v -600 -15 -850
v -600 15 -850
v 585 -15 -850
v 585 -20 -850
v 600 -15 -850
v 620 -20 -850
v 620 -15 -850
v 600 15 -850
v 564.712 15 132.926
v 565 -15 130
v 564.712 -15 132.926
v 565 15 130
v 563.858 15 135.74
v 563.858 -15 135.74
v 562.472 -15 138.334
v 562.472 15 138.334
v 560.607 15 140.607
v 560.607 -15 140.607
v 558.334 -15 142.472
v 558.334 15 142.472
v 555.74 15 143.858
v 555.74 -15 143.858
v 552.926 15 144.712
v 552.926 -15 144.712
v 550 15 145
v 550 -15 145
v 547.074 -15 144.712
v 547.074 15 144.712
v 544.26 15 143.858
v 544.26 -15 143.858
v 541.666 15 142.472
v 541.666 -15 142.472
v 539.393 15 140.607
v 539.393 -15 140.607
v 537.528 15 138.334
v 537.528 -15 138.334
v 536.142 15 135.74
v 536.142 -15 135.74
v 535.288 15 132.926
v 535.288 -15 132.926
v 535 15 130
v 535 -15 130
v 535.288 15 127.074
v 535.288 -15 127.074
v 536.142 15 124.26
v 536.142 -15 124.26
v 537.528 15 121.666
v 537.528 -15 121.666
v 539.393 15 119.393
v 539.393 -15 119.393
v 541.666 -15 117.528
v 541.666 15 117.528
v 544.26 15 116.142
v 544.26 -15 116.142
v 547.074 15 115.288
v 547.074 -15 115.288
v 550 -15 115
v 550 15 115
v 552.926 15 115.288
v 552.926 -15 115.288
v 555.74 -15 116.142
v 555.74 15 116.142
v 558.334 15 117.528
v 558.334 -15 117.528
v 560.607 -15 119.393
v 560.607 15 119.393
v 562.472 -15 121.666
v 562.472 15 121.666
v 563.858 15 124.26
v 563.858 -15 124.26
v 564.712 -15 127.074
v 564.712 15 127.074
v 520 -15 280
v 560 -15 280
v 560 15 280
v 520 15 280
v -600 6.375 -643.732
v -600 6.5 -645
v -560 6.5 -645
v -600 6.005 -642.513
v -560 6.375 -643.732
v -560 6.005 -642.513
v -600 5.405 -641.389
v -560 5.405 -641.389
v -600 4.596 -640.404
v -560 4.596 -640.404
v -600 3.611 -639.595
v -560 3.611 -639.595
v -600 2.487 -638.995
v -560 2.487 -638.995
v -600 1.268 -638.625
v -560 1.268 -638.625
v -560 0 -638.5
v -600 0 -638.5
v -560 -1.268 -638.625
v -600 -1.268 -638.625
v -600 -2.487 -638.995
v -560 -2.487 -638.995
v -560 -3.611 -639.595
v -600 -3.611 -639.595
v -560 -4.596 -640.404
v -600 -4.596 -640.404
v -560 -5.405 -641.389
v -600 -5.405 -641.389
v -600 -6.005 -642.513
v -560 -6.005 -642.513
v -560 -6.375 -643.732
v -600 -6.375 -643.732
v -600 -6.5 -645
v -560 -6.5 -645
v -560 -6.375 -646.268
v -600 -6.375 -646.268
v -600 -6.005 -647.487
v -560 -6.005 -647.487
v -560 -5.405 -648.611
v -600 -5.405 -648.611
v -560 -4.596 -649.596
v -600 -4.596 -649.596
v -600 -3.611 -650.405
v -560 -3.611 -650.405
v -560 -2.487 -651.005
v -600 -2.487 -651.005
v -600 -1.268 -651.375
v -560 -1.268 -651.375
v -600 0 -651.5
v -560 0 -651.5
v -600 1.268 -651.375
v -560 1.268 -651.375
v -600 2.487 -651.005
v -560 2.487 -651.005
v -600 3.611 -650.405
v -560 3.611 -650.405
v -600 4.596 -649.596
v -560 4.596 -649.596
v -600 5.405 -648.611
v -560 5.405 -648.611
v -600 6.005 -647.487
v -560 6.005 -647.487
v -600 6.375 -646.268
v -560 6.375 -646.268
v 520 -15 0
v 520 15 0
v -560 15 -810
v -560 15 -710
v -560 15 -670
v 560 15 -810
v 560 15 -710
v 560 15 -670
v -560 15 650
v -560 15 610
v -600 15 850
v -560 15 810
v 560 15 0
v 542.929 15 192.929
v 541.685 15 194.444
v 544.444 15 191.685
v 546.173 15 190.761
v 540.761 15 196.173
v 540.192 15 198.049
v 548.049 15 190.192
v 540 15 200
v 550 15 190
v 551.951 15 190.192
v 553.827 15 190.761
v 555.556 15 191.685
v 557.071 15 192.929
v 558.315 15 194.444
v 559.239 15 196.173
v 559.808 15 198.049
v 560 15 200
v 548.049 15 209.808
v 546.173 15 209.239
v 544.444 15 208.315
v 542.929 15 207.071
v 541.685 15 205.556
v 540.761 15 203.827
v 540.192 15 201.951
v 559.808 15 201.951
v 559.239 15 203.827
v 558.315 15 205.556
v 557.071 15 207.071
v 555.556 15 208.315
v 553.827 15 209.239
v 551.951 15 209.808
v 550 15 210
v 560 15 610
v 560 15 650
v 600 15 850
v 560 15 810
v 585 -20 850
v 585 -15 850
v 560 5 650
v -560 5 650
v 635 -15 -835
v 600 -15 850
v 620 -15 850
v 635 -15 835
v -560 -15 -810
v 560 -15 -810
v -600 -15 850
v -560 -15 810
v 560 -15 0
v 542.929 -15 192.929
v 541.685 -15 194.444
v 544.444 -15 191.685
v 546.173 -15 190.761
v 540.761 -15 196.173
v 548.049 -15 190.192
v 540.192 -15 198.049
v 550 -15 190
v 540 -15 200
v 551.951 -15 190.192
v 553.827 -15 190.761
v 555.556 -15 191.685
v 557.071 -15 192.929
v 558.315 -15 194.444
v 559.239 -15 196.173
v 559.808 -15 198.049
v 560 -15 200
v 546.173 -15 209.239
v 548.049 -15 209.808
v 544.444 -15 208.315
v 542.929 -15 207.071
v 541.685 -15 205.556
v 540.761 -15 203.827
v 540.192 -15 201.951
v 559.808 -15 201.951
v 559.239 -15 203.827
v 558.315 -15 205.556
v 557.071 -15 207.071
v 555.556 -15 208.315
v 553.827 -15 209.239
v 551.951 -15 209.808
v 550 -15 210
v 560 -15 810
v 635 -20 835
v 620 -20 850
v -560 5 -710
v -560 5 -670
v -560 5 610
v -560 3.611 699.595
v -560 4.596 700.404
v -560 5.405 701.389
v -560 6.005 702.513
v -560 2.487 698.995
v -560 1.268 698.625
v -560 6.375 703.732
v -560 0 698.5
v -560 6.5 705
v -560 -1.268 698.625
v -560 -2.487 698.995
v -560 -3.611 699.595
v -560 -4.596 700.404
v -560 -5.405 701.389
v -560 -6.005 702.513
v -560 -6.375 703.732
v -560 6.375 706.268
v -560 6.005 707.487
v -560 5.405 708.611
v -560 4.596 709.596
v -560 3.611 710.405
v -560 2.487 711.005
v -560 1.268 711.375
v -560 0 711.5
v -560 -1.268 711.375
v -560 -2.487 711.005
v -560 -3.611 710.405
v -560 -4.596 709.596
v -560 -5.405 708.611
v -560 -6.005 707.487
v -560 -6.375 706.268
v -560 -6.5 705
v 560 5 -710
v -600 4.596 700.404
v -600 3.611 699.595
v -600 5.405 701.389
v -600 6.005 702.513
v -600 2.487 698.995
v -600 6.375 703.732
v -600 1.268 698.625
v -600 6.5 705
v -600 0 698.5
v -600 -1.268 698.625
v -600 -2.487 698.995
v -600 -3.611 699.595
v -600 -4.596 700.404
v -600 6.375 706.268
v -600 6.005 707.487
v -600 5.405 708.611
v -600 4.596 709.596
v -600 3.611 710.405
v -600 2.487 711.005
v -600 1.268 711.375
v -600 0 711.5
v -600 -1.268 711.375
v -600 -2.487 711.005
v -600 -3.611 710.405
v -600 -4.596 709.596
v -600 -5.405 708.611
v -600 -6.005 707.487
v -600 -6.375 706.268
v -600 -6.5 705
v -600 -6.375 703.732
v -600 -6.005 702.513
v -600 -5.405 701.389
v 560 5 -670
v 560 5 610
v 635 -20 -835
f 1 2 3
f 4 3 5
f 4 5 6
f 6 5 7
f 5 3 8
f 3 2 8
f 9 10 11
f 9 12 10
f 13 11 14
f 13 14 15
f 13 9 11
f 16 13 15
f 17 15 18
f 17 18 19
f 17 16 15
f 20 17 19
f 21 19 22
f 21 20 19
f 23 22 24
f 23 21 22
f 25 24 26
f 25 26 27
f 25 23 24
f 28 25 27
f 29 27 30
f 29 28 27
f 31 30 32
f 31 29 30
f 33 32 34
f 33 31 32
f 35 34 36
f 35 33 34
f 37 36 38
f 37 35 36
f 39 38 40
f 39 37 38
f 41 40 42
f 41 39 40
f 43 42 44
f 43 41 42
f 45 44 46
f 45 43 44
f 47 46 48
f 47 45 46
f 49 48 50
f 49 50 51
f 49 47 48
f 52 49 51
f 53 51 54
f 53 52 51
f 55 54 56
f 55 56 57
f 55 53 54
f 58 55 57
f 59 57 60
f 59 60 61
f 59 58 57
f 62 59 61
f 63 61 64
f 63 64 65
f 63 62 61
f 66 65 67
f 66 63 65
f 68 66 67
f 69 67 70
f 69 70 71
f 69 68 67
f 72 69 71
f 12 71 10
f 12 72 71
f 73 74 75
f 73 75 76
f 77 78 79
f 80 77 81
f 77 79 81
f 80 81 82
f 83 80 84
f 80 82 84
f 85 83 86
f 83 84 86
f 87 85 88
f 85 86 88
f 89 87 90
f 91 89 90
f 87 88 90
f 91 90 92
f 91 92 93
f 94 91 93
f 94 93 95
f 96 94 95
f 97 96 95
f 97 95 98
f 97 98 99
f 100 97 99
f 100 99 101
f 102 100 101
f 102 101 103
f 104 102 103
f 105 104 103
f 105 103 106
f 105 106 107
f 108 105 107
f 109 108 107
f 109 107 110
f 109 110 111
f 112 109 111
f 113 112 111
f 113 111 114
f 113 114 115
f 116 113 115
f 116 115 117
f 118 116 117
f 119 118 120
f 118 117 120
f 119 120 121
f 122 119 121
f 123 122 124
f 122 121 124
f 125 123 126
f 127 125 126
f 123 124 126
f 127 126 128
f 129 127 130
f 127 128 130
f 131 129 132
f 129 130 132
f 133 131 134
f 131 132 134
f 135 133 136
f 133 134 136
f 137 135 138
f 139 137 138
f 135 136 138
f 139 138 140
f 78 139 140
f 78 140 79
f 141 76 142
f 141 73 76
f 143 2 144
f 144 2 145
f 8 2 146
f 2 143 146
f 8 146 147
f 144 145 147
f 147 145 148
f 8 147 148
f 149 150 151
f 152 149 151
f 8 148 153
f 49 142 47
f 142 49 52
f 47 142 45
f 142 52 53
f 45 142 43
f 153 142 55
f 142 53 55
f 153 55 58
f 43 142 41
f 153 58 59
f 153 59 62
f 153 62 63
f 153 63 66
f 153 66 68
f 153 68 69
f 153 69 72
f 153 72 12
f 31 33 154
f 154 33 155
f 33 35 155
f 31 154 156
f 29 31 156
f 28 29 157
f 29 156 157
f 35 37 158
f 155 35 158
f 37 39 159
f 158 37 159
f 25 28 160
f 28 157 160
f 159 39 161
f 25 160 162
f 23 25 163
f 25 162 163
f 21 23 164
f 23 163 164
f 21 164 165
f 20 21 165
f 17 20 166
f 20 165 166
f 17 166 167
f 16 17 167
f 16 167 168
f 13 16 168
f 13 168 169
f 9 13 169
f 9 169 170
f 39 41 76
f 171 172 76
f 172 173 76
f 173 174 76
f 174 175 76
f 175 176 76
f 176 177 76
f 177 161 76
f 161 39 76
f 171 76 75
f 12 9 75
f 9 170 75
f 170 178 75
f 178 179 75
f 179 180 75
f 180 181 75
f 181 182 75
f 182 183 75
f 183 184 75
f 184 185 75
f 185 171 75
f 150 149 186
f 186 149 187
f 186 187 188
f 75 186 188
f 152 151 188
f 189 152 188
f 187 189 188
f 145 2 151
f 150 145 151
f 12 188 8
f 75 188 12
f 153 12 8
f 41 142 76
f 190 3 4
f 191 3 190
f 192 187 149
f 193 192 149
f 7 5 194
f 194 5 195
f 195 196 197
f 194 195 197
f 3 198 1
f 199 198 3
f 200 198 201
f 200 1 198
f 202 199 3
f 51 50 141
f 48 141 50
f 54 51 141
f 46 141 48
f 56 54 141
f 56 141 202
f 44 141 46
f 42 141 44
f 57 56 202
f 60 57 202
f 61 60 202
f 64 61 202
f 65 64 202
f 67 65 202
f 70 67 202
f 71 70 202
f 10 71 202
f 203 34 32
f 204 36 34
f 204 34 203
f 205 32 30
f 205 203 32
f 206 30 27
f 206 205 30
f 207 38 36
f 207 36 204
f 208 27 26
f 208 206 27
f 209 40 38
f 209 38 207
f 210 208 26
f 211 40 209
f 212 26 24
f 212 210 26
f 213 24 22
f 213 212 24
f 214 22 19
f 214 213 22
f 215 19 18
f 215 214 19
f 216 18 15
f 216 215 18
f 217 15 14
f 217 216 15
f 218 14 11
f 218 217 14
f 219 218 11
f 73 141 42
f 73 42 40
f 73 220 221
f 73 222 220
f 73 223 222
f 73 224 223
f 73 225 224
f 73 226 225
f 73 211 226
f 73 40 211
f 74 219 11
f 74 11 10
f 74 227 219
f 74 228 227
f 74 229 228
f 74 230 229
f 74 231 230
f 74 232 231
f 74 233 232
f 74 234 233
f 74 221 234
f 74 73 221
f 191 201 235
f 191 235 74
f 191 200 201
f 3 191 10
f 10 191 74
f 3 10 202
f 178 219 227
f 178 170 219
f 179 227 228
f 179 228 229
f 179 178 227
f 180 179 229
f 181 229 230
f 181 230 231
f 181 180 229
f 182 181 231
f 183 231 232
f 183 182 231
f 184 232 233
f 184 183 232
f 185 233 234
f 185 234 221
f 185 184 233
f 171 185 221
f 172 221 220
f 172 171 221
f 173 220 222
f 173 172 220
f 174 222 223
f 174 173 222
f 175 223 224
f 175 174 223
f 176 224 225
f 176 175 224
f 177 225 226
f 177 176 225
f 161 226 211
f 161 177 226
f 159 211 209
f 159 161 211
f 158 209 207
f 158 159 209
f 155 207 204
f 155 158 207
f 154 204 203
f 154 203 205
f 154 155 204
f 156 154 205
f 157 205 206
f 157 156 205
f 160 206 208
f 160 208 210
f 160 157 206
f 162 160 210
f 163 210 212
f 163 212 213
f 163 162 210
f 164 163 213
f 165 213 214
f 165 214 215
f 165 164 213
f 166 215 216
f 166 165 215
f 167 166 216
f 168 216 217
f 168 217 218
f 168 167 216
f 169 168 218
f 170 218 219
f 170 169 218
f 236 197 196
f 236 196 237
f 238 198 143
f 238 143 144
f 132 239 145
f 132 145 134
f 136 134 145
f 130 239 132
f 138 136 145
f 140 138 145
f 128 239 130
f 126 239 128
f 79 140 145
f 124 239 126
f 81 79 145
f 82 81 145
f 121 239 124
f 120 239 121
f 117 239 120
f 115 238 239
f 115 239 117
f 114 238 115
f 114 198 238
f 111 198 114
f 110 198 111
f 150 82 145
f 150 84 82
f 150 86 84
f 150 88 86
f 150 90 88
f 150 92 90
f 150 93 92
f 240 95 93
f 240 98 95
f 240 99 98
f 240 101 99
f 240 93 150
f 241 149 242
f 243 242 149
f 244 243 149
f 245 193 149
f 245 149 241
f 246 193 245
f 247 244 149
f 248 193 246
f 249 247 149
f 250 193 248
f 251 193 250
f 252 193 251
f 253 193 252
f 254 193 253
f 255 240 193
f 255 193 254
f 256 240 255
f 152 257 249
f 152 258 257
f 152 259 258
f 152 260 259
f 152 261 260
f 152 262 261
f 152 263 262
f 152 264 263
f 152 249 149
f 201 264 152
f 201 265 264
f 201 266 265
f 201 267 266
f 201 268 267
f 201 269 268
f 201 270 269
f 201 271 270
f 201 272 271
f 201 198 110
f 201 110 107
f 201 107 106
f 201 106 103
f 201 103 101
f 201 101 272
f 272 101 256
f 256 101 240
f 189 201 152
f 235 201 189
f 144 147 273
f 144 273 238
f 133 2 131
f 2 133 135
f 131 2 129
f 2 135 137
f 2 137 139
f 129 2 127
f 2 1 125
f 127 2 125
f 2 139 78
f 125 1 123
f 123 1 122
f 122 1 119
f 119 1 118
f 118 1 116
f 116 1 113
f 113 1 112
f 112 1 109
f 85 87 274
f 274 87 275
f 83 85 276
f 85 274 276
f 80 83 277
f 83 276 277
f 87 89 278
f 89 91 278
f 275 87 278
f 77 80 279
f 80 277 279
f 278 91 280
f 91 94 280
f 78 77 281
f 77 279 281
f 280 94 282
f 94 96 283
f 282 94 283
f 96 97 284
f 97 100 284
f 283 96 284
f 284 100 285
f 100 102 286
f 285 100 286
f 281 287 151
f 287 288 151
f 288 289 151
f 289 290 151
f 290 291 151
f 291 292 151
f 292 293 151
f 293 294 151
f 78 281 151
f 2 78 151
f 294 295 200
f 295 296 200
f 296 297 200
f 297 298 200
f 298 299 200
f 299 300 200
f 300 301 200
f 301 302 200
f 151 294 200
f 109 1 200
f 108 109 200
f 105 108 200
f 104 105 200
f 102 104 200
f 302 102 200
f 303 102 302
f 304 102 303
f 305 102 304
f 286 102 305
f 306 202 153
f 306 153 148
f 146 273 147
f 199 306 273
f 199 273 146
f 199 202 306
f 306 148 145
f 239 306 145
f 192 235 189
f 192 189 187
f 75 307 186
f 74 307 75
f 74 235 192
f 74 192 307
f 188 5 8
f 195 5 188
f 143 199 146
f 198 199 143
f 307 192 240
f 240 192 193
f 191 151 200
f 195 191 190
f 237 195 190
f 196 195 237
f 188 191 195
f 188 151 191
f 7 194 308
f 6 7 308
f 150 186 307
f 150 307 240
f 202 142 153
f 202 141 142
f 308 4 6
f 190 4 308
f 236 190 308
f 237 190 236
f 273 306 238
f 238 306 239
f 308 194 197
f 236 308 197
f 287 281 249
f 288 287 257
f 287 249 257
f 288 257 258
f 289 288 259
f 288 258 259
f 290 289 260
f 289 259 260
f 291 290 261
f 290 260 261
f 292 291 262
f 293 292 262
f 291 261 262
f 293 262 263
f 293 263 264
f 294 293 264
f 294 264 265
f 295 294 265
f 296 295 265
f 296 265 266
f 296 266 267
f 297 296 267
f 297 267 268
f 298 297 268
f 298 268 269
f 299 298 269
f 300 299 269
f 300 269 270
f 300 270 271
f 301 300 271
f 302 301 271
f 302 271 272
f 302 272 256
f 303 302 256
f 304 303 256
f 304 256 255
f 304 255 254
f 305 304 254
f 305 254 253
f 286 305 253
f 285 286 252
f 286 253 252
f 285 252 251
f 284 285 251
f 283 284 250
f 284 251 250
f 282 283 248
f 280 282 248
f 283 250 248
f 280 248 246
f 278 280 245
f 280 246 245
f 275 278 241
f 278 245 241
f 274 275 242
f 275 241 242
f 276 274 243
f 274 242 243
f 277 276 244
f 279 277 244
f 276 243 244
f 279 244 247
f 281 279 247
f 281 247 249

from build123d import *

# Parameters (mm, degrees)
F0_W     = 1200
F0_H     = 1700
F0_R     = 15
F0_R_2   = 10
F1_DEPTH = 15
F2_W     = 1120
F2_H     = 40
F3_DEPTH = 10
F5_D     = 13
F5_DEPTH = 50
F5_TIP   = 3.9055940237
F6_D     = 13
F6_DEPTH = 50
F6_TIP   = 3.9055940237
F7_W     = 50
F7_H     = 1700
F8_DEPTH = 5
F9_SIZE  = 15


with BuildPart() as f1:
    # F0 (on Front) → F1 (new body, symmetric)
    with BuildSketch(Plane.XZ):
        Rectangle(F0_W, F0_H)
        Polygon((-560, -810), (-560, 810), (560, 810), (560, 280), (520, 280), (520, 0), (560, 0), (560, -810), align=None, mode=Mode.SUBTRACT)
        with Locations((550, 130)):
            Circle(F0_R, mode=Mode.SUBTRACT)
        with Locations((550, 200)):
            Circle(F0_R_2, mode=Mode.SUBTRACT)
    extrude(amount=F1_DEPTH, both=True)

    # F2 (on face) → F3 (join)
    with BuildSketch(Plane(origin=(0, 15, 0), x_dir=(-1, 0, 0), z_dir=(0, 1, 0))):
        with Locations((0, 630)):
            Rectangle(F2_W, F2_H)
        with Locations((0, -690)):
            Rectangle(F2_W, F2_H)
    extrude(amount=-F3_DEPTH)

    # F5
    with Locations(Plane(origin=(-600, 0, 0), x_dir=(0, -1, 0), z_dir=(-1, 0, 0))):
        with Locations((0, -645)):
            Hole(F5_D / 2, depth=F5_DEPTH)
            with Locations((0, 0, -(F5_DEPTH + F5_TIP / 2))):  # 118° drill point
                Cone(0, F5_D / 2, F5_TIP, mode=Mode.SUBTRACT)

    # F6
    with Locations(Plane(origin=(-600, 0, 0), x_dir=(0, -1, 0), z_dir=(-1, 0, 0))):
        with Locations((0, 705)):
            Hole(F6_D / 2, depth=F6_DEPTH)
            with Locations((0, 0, -(F6_DEPTH + F6_TIP / 2))):  # 118° drill point
                Cone(0, F6_D / 2, F6_TIP, mode=Mode.SUBTRACT)

    # F7 (on face) → F8 (join)
    with BuildSketch(Plane.XZ.offset(15)):
        with Locations((610, 0)):
            Rectangle(F7_W, F7_H)
    extrude(amount=F8_DEPTH)

    # F9
    f9_edges = [f1.edges().sort_by_distance(p)[0] for p in [
        (635, -17.5, -850),
        (635, -17.5, 850),
    ]]
    chamfer(f9_edges, length=F9_SIZE)


solid = f1.part
